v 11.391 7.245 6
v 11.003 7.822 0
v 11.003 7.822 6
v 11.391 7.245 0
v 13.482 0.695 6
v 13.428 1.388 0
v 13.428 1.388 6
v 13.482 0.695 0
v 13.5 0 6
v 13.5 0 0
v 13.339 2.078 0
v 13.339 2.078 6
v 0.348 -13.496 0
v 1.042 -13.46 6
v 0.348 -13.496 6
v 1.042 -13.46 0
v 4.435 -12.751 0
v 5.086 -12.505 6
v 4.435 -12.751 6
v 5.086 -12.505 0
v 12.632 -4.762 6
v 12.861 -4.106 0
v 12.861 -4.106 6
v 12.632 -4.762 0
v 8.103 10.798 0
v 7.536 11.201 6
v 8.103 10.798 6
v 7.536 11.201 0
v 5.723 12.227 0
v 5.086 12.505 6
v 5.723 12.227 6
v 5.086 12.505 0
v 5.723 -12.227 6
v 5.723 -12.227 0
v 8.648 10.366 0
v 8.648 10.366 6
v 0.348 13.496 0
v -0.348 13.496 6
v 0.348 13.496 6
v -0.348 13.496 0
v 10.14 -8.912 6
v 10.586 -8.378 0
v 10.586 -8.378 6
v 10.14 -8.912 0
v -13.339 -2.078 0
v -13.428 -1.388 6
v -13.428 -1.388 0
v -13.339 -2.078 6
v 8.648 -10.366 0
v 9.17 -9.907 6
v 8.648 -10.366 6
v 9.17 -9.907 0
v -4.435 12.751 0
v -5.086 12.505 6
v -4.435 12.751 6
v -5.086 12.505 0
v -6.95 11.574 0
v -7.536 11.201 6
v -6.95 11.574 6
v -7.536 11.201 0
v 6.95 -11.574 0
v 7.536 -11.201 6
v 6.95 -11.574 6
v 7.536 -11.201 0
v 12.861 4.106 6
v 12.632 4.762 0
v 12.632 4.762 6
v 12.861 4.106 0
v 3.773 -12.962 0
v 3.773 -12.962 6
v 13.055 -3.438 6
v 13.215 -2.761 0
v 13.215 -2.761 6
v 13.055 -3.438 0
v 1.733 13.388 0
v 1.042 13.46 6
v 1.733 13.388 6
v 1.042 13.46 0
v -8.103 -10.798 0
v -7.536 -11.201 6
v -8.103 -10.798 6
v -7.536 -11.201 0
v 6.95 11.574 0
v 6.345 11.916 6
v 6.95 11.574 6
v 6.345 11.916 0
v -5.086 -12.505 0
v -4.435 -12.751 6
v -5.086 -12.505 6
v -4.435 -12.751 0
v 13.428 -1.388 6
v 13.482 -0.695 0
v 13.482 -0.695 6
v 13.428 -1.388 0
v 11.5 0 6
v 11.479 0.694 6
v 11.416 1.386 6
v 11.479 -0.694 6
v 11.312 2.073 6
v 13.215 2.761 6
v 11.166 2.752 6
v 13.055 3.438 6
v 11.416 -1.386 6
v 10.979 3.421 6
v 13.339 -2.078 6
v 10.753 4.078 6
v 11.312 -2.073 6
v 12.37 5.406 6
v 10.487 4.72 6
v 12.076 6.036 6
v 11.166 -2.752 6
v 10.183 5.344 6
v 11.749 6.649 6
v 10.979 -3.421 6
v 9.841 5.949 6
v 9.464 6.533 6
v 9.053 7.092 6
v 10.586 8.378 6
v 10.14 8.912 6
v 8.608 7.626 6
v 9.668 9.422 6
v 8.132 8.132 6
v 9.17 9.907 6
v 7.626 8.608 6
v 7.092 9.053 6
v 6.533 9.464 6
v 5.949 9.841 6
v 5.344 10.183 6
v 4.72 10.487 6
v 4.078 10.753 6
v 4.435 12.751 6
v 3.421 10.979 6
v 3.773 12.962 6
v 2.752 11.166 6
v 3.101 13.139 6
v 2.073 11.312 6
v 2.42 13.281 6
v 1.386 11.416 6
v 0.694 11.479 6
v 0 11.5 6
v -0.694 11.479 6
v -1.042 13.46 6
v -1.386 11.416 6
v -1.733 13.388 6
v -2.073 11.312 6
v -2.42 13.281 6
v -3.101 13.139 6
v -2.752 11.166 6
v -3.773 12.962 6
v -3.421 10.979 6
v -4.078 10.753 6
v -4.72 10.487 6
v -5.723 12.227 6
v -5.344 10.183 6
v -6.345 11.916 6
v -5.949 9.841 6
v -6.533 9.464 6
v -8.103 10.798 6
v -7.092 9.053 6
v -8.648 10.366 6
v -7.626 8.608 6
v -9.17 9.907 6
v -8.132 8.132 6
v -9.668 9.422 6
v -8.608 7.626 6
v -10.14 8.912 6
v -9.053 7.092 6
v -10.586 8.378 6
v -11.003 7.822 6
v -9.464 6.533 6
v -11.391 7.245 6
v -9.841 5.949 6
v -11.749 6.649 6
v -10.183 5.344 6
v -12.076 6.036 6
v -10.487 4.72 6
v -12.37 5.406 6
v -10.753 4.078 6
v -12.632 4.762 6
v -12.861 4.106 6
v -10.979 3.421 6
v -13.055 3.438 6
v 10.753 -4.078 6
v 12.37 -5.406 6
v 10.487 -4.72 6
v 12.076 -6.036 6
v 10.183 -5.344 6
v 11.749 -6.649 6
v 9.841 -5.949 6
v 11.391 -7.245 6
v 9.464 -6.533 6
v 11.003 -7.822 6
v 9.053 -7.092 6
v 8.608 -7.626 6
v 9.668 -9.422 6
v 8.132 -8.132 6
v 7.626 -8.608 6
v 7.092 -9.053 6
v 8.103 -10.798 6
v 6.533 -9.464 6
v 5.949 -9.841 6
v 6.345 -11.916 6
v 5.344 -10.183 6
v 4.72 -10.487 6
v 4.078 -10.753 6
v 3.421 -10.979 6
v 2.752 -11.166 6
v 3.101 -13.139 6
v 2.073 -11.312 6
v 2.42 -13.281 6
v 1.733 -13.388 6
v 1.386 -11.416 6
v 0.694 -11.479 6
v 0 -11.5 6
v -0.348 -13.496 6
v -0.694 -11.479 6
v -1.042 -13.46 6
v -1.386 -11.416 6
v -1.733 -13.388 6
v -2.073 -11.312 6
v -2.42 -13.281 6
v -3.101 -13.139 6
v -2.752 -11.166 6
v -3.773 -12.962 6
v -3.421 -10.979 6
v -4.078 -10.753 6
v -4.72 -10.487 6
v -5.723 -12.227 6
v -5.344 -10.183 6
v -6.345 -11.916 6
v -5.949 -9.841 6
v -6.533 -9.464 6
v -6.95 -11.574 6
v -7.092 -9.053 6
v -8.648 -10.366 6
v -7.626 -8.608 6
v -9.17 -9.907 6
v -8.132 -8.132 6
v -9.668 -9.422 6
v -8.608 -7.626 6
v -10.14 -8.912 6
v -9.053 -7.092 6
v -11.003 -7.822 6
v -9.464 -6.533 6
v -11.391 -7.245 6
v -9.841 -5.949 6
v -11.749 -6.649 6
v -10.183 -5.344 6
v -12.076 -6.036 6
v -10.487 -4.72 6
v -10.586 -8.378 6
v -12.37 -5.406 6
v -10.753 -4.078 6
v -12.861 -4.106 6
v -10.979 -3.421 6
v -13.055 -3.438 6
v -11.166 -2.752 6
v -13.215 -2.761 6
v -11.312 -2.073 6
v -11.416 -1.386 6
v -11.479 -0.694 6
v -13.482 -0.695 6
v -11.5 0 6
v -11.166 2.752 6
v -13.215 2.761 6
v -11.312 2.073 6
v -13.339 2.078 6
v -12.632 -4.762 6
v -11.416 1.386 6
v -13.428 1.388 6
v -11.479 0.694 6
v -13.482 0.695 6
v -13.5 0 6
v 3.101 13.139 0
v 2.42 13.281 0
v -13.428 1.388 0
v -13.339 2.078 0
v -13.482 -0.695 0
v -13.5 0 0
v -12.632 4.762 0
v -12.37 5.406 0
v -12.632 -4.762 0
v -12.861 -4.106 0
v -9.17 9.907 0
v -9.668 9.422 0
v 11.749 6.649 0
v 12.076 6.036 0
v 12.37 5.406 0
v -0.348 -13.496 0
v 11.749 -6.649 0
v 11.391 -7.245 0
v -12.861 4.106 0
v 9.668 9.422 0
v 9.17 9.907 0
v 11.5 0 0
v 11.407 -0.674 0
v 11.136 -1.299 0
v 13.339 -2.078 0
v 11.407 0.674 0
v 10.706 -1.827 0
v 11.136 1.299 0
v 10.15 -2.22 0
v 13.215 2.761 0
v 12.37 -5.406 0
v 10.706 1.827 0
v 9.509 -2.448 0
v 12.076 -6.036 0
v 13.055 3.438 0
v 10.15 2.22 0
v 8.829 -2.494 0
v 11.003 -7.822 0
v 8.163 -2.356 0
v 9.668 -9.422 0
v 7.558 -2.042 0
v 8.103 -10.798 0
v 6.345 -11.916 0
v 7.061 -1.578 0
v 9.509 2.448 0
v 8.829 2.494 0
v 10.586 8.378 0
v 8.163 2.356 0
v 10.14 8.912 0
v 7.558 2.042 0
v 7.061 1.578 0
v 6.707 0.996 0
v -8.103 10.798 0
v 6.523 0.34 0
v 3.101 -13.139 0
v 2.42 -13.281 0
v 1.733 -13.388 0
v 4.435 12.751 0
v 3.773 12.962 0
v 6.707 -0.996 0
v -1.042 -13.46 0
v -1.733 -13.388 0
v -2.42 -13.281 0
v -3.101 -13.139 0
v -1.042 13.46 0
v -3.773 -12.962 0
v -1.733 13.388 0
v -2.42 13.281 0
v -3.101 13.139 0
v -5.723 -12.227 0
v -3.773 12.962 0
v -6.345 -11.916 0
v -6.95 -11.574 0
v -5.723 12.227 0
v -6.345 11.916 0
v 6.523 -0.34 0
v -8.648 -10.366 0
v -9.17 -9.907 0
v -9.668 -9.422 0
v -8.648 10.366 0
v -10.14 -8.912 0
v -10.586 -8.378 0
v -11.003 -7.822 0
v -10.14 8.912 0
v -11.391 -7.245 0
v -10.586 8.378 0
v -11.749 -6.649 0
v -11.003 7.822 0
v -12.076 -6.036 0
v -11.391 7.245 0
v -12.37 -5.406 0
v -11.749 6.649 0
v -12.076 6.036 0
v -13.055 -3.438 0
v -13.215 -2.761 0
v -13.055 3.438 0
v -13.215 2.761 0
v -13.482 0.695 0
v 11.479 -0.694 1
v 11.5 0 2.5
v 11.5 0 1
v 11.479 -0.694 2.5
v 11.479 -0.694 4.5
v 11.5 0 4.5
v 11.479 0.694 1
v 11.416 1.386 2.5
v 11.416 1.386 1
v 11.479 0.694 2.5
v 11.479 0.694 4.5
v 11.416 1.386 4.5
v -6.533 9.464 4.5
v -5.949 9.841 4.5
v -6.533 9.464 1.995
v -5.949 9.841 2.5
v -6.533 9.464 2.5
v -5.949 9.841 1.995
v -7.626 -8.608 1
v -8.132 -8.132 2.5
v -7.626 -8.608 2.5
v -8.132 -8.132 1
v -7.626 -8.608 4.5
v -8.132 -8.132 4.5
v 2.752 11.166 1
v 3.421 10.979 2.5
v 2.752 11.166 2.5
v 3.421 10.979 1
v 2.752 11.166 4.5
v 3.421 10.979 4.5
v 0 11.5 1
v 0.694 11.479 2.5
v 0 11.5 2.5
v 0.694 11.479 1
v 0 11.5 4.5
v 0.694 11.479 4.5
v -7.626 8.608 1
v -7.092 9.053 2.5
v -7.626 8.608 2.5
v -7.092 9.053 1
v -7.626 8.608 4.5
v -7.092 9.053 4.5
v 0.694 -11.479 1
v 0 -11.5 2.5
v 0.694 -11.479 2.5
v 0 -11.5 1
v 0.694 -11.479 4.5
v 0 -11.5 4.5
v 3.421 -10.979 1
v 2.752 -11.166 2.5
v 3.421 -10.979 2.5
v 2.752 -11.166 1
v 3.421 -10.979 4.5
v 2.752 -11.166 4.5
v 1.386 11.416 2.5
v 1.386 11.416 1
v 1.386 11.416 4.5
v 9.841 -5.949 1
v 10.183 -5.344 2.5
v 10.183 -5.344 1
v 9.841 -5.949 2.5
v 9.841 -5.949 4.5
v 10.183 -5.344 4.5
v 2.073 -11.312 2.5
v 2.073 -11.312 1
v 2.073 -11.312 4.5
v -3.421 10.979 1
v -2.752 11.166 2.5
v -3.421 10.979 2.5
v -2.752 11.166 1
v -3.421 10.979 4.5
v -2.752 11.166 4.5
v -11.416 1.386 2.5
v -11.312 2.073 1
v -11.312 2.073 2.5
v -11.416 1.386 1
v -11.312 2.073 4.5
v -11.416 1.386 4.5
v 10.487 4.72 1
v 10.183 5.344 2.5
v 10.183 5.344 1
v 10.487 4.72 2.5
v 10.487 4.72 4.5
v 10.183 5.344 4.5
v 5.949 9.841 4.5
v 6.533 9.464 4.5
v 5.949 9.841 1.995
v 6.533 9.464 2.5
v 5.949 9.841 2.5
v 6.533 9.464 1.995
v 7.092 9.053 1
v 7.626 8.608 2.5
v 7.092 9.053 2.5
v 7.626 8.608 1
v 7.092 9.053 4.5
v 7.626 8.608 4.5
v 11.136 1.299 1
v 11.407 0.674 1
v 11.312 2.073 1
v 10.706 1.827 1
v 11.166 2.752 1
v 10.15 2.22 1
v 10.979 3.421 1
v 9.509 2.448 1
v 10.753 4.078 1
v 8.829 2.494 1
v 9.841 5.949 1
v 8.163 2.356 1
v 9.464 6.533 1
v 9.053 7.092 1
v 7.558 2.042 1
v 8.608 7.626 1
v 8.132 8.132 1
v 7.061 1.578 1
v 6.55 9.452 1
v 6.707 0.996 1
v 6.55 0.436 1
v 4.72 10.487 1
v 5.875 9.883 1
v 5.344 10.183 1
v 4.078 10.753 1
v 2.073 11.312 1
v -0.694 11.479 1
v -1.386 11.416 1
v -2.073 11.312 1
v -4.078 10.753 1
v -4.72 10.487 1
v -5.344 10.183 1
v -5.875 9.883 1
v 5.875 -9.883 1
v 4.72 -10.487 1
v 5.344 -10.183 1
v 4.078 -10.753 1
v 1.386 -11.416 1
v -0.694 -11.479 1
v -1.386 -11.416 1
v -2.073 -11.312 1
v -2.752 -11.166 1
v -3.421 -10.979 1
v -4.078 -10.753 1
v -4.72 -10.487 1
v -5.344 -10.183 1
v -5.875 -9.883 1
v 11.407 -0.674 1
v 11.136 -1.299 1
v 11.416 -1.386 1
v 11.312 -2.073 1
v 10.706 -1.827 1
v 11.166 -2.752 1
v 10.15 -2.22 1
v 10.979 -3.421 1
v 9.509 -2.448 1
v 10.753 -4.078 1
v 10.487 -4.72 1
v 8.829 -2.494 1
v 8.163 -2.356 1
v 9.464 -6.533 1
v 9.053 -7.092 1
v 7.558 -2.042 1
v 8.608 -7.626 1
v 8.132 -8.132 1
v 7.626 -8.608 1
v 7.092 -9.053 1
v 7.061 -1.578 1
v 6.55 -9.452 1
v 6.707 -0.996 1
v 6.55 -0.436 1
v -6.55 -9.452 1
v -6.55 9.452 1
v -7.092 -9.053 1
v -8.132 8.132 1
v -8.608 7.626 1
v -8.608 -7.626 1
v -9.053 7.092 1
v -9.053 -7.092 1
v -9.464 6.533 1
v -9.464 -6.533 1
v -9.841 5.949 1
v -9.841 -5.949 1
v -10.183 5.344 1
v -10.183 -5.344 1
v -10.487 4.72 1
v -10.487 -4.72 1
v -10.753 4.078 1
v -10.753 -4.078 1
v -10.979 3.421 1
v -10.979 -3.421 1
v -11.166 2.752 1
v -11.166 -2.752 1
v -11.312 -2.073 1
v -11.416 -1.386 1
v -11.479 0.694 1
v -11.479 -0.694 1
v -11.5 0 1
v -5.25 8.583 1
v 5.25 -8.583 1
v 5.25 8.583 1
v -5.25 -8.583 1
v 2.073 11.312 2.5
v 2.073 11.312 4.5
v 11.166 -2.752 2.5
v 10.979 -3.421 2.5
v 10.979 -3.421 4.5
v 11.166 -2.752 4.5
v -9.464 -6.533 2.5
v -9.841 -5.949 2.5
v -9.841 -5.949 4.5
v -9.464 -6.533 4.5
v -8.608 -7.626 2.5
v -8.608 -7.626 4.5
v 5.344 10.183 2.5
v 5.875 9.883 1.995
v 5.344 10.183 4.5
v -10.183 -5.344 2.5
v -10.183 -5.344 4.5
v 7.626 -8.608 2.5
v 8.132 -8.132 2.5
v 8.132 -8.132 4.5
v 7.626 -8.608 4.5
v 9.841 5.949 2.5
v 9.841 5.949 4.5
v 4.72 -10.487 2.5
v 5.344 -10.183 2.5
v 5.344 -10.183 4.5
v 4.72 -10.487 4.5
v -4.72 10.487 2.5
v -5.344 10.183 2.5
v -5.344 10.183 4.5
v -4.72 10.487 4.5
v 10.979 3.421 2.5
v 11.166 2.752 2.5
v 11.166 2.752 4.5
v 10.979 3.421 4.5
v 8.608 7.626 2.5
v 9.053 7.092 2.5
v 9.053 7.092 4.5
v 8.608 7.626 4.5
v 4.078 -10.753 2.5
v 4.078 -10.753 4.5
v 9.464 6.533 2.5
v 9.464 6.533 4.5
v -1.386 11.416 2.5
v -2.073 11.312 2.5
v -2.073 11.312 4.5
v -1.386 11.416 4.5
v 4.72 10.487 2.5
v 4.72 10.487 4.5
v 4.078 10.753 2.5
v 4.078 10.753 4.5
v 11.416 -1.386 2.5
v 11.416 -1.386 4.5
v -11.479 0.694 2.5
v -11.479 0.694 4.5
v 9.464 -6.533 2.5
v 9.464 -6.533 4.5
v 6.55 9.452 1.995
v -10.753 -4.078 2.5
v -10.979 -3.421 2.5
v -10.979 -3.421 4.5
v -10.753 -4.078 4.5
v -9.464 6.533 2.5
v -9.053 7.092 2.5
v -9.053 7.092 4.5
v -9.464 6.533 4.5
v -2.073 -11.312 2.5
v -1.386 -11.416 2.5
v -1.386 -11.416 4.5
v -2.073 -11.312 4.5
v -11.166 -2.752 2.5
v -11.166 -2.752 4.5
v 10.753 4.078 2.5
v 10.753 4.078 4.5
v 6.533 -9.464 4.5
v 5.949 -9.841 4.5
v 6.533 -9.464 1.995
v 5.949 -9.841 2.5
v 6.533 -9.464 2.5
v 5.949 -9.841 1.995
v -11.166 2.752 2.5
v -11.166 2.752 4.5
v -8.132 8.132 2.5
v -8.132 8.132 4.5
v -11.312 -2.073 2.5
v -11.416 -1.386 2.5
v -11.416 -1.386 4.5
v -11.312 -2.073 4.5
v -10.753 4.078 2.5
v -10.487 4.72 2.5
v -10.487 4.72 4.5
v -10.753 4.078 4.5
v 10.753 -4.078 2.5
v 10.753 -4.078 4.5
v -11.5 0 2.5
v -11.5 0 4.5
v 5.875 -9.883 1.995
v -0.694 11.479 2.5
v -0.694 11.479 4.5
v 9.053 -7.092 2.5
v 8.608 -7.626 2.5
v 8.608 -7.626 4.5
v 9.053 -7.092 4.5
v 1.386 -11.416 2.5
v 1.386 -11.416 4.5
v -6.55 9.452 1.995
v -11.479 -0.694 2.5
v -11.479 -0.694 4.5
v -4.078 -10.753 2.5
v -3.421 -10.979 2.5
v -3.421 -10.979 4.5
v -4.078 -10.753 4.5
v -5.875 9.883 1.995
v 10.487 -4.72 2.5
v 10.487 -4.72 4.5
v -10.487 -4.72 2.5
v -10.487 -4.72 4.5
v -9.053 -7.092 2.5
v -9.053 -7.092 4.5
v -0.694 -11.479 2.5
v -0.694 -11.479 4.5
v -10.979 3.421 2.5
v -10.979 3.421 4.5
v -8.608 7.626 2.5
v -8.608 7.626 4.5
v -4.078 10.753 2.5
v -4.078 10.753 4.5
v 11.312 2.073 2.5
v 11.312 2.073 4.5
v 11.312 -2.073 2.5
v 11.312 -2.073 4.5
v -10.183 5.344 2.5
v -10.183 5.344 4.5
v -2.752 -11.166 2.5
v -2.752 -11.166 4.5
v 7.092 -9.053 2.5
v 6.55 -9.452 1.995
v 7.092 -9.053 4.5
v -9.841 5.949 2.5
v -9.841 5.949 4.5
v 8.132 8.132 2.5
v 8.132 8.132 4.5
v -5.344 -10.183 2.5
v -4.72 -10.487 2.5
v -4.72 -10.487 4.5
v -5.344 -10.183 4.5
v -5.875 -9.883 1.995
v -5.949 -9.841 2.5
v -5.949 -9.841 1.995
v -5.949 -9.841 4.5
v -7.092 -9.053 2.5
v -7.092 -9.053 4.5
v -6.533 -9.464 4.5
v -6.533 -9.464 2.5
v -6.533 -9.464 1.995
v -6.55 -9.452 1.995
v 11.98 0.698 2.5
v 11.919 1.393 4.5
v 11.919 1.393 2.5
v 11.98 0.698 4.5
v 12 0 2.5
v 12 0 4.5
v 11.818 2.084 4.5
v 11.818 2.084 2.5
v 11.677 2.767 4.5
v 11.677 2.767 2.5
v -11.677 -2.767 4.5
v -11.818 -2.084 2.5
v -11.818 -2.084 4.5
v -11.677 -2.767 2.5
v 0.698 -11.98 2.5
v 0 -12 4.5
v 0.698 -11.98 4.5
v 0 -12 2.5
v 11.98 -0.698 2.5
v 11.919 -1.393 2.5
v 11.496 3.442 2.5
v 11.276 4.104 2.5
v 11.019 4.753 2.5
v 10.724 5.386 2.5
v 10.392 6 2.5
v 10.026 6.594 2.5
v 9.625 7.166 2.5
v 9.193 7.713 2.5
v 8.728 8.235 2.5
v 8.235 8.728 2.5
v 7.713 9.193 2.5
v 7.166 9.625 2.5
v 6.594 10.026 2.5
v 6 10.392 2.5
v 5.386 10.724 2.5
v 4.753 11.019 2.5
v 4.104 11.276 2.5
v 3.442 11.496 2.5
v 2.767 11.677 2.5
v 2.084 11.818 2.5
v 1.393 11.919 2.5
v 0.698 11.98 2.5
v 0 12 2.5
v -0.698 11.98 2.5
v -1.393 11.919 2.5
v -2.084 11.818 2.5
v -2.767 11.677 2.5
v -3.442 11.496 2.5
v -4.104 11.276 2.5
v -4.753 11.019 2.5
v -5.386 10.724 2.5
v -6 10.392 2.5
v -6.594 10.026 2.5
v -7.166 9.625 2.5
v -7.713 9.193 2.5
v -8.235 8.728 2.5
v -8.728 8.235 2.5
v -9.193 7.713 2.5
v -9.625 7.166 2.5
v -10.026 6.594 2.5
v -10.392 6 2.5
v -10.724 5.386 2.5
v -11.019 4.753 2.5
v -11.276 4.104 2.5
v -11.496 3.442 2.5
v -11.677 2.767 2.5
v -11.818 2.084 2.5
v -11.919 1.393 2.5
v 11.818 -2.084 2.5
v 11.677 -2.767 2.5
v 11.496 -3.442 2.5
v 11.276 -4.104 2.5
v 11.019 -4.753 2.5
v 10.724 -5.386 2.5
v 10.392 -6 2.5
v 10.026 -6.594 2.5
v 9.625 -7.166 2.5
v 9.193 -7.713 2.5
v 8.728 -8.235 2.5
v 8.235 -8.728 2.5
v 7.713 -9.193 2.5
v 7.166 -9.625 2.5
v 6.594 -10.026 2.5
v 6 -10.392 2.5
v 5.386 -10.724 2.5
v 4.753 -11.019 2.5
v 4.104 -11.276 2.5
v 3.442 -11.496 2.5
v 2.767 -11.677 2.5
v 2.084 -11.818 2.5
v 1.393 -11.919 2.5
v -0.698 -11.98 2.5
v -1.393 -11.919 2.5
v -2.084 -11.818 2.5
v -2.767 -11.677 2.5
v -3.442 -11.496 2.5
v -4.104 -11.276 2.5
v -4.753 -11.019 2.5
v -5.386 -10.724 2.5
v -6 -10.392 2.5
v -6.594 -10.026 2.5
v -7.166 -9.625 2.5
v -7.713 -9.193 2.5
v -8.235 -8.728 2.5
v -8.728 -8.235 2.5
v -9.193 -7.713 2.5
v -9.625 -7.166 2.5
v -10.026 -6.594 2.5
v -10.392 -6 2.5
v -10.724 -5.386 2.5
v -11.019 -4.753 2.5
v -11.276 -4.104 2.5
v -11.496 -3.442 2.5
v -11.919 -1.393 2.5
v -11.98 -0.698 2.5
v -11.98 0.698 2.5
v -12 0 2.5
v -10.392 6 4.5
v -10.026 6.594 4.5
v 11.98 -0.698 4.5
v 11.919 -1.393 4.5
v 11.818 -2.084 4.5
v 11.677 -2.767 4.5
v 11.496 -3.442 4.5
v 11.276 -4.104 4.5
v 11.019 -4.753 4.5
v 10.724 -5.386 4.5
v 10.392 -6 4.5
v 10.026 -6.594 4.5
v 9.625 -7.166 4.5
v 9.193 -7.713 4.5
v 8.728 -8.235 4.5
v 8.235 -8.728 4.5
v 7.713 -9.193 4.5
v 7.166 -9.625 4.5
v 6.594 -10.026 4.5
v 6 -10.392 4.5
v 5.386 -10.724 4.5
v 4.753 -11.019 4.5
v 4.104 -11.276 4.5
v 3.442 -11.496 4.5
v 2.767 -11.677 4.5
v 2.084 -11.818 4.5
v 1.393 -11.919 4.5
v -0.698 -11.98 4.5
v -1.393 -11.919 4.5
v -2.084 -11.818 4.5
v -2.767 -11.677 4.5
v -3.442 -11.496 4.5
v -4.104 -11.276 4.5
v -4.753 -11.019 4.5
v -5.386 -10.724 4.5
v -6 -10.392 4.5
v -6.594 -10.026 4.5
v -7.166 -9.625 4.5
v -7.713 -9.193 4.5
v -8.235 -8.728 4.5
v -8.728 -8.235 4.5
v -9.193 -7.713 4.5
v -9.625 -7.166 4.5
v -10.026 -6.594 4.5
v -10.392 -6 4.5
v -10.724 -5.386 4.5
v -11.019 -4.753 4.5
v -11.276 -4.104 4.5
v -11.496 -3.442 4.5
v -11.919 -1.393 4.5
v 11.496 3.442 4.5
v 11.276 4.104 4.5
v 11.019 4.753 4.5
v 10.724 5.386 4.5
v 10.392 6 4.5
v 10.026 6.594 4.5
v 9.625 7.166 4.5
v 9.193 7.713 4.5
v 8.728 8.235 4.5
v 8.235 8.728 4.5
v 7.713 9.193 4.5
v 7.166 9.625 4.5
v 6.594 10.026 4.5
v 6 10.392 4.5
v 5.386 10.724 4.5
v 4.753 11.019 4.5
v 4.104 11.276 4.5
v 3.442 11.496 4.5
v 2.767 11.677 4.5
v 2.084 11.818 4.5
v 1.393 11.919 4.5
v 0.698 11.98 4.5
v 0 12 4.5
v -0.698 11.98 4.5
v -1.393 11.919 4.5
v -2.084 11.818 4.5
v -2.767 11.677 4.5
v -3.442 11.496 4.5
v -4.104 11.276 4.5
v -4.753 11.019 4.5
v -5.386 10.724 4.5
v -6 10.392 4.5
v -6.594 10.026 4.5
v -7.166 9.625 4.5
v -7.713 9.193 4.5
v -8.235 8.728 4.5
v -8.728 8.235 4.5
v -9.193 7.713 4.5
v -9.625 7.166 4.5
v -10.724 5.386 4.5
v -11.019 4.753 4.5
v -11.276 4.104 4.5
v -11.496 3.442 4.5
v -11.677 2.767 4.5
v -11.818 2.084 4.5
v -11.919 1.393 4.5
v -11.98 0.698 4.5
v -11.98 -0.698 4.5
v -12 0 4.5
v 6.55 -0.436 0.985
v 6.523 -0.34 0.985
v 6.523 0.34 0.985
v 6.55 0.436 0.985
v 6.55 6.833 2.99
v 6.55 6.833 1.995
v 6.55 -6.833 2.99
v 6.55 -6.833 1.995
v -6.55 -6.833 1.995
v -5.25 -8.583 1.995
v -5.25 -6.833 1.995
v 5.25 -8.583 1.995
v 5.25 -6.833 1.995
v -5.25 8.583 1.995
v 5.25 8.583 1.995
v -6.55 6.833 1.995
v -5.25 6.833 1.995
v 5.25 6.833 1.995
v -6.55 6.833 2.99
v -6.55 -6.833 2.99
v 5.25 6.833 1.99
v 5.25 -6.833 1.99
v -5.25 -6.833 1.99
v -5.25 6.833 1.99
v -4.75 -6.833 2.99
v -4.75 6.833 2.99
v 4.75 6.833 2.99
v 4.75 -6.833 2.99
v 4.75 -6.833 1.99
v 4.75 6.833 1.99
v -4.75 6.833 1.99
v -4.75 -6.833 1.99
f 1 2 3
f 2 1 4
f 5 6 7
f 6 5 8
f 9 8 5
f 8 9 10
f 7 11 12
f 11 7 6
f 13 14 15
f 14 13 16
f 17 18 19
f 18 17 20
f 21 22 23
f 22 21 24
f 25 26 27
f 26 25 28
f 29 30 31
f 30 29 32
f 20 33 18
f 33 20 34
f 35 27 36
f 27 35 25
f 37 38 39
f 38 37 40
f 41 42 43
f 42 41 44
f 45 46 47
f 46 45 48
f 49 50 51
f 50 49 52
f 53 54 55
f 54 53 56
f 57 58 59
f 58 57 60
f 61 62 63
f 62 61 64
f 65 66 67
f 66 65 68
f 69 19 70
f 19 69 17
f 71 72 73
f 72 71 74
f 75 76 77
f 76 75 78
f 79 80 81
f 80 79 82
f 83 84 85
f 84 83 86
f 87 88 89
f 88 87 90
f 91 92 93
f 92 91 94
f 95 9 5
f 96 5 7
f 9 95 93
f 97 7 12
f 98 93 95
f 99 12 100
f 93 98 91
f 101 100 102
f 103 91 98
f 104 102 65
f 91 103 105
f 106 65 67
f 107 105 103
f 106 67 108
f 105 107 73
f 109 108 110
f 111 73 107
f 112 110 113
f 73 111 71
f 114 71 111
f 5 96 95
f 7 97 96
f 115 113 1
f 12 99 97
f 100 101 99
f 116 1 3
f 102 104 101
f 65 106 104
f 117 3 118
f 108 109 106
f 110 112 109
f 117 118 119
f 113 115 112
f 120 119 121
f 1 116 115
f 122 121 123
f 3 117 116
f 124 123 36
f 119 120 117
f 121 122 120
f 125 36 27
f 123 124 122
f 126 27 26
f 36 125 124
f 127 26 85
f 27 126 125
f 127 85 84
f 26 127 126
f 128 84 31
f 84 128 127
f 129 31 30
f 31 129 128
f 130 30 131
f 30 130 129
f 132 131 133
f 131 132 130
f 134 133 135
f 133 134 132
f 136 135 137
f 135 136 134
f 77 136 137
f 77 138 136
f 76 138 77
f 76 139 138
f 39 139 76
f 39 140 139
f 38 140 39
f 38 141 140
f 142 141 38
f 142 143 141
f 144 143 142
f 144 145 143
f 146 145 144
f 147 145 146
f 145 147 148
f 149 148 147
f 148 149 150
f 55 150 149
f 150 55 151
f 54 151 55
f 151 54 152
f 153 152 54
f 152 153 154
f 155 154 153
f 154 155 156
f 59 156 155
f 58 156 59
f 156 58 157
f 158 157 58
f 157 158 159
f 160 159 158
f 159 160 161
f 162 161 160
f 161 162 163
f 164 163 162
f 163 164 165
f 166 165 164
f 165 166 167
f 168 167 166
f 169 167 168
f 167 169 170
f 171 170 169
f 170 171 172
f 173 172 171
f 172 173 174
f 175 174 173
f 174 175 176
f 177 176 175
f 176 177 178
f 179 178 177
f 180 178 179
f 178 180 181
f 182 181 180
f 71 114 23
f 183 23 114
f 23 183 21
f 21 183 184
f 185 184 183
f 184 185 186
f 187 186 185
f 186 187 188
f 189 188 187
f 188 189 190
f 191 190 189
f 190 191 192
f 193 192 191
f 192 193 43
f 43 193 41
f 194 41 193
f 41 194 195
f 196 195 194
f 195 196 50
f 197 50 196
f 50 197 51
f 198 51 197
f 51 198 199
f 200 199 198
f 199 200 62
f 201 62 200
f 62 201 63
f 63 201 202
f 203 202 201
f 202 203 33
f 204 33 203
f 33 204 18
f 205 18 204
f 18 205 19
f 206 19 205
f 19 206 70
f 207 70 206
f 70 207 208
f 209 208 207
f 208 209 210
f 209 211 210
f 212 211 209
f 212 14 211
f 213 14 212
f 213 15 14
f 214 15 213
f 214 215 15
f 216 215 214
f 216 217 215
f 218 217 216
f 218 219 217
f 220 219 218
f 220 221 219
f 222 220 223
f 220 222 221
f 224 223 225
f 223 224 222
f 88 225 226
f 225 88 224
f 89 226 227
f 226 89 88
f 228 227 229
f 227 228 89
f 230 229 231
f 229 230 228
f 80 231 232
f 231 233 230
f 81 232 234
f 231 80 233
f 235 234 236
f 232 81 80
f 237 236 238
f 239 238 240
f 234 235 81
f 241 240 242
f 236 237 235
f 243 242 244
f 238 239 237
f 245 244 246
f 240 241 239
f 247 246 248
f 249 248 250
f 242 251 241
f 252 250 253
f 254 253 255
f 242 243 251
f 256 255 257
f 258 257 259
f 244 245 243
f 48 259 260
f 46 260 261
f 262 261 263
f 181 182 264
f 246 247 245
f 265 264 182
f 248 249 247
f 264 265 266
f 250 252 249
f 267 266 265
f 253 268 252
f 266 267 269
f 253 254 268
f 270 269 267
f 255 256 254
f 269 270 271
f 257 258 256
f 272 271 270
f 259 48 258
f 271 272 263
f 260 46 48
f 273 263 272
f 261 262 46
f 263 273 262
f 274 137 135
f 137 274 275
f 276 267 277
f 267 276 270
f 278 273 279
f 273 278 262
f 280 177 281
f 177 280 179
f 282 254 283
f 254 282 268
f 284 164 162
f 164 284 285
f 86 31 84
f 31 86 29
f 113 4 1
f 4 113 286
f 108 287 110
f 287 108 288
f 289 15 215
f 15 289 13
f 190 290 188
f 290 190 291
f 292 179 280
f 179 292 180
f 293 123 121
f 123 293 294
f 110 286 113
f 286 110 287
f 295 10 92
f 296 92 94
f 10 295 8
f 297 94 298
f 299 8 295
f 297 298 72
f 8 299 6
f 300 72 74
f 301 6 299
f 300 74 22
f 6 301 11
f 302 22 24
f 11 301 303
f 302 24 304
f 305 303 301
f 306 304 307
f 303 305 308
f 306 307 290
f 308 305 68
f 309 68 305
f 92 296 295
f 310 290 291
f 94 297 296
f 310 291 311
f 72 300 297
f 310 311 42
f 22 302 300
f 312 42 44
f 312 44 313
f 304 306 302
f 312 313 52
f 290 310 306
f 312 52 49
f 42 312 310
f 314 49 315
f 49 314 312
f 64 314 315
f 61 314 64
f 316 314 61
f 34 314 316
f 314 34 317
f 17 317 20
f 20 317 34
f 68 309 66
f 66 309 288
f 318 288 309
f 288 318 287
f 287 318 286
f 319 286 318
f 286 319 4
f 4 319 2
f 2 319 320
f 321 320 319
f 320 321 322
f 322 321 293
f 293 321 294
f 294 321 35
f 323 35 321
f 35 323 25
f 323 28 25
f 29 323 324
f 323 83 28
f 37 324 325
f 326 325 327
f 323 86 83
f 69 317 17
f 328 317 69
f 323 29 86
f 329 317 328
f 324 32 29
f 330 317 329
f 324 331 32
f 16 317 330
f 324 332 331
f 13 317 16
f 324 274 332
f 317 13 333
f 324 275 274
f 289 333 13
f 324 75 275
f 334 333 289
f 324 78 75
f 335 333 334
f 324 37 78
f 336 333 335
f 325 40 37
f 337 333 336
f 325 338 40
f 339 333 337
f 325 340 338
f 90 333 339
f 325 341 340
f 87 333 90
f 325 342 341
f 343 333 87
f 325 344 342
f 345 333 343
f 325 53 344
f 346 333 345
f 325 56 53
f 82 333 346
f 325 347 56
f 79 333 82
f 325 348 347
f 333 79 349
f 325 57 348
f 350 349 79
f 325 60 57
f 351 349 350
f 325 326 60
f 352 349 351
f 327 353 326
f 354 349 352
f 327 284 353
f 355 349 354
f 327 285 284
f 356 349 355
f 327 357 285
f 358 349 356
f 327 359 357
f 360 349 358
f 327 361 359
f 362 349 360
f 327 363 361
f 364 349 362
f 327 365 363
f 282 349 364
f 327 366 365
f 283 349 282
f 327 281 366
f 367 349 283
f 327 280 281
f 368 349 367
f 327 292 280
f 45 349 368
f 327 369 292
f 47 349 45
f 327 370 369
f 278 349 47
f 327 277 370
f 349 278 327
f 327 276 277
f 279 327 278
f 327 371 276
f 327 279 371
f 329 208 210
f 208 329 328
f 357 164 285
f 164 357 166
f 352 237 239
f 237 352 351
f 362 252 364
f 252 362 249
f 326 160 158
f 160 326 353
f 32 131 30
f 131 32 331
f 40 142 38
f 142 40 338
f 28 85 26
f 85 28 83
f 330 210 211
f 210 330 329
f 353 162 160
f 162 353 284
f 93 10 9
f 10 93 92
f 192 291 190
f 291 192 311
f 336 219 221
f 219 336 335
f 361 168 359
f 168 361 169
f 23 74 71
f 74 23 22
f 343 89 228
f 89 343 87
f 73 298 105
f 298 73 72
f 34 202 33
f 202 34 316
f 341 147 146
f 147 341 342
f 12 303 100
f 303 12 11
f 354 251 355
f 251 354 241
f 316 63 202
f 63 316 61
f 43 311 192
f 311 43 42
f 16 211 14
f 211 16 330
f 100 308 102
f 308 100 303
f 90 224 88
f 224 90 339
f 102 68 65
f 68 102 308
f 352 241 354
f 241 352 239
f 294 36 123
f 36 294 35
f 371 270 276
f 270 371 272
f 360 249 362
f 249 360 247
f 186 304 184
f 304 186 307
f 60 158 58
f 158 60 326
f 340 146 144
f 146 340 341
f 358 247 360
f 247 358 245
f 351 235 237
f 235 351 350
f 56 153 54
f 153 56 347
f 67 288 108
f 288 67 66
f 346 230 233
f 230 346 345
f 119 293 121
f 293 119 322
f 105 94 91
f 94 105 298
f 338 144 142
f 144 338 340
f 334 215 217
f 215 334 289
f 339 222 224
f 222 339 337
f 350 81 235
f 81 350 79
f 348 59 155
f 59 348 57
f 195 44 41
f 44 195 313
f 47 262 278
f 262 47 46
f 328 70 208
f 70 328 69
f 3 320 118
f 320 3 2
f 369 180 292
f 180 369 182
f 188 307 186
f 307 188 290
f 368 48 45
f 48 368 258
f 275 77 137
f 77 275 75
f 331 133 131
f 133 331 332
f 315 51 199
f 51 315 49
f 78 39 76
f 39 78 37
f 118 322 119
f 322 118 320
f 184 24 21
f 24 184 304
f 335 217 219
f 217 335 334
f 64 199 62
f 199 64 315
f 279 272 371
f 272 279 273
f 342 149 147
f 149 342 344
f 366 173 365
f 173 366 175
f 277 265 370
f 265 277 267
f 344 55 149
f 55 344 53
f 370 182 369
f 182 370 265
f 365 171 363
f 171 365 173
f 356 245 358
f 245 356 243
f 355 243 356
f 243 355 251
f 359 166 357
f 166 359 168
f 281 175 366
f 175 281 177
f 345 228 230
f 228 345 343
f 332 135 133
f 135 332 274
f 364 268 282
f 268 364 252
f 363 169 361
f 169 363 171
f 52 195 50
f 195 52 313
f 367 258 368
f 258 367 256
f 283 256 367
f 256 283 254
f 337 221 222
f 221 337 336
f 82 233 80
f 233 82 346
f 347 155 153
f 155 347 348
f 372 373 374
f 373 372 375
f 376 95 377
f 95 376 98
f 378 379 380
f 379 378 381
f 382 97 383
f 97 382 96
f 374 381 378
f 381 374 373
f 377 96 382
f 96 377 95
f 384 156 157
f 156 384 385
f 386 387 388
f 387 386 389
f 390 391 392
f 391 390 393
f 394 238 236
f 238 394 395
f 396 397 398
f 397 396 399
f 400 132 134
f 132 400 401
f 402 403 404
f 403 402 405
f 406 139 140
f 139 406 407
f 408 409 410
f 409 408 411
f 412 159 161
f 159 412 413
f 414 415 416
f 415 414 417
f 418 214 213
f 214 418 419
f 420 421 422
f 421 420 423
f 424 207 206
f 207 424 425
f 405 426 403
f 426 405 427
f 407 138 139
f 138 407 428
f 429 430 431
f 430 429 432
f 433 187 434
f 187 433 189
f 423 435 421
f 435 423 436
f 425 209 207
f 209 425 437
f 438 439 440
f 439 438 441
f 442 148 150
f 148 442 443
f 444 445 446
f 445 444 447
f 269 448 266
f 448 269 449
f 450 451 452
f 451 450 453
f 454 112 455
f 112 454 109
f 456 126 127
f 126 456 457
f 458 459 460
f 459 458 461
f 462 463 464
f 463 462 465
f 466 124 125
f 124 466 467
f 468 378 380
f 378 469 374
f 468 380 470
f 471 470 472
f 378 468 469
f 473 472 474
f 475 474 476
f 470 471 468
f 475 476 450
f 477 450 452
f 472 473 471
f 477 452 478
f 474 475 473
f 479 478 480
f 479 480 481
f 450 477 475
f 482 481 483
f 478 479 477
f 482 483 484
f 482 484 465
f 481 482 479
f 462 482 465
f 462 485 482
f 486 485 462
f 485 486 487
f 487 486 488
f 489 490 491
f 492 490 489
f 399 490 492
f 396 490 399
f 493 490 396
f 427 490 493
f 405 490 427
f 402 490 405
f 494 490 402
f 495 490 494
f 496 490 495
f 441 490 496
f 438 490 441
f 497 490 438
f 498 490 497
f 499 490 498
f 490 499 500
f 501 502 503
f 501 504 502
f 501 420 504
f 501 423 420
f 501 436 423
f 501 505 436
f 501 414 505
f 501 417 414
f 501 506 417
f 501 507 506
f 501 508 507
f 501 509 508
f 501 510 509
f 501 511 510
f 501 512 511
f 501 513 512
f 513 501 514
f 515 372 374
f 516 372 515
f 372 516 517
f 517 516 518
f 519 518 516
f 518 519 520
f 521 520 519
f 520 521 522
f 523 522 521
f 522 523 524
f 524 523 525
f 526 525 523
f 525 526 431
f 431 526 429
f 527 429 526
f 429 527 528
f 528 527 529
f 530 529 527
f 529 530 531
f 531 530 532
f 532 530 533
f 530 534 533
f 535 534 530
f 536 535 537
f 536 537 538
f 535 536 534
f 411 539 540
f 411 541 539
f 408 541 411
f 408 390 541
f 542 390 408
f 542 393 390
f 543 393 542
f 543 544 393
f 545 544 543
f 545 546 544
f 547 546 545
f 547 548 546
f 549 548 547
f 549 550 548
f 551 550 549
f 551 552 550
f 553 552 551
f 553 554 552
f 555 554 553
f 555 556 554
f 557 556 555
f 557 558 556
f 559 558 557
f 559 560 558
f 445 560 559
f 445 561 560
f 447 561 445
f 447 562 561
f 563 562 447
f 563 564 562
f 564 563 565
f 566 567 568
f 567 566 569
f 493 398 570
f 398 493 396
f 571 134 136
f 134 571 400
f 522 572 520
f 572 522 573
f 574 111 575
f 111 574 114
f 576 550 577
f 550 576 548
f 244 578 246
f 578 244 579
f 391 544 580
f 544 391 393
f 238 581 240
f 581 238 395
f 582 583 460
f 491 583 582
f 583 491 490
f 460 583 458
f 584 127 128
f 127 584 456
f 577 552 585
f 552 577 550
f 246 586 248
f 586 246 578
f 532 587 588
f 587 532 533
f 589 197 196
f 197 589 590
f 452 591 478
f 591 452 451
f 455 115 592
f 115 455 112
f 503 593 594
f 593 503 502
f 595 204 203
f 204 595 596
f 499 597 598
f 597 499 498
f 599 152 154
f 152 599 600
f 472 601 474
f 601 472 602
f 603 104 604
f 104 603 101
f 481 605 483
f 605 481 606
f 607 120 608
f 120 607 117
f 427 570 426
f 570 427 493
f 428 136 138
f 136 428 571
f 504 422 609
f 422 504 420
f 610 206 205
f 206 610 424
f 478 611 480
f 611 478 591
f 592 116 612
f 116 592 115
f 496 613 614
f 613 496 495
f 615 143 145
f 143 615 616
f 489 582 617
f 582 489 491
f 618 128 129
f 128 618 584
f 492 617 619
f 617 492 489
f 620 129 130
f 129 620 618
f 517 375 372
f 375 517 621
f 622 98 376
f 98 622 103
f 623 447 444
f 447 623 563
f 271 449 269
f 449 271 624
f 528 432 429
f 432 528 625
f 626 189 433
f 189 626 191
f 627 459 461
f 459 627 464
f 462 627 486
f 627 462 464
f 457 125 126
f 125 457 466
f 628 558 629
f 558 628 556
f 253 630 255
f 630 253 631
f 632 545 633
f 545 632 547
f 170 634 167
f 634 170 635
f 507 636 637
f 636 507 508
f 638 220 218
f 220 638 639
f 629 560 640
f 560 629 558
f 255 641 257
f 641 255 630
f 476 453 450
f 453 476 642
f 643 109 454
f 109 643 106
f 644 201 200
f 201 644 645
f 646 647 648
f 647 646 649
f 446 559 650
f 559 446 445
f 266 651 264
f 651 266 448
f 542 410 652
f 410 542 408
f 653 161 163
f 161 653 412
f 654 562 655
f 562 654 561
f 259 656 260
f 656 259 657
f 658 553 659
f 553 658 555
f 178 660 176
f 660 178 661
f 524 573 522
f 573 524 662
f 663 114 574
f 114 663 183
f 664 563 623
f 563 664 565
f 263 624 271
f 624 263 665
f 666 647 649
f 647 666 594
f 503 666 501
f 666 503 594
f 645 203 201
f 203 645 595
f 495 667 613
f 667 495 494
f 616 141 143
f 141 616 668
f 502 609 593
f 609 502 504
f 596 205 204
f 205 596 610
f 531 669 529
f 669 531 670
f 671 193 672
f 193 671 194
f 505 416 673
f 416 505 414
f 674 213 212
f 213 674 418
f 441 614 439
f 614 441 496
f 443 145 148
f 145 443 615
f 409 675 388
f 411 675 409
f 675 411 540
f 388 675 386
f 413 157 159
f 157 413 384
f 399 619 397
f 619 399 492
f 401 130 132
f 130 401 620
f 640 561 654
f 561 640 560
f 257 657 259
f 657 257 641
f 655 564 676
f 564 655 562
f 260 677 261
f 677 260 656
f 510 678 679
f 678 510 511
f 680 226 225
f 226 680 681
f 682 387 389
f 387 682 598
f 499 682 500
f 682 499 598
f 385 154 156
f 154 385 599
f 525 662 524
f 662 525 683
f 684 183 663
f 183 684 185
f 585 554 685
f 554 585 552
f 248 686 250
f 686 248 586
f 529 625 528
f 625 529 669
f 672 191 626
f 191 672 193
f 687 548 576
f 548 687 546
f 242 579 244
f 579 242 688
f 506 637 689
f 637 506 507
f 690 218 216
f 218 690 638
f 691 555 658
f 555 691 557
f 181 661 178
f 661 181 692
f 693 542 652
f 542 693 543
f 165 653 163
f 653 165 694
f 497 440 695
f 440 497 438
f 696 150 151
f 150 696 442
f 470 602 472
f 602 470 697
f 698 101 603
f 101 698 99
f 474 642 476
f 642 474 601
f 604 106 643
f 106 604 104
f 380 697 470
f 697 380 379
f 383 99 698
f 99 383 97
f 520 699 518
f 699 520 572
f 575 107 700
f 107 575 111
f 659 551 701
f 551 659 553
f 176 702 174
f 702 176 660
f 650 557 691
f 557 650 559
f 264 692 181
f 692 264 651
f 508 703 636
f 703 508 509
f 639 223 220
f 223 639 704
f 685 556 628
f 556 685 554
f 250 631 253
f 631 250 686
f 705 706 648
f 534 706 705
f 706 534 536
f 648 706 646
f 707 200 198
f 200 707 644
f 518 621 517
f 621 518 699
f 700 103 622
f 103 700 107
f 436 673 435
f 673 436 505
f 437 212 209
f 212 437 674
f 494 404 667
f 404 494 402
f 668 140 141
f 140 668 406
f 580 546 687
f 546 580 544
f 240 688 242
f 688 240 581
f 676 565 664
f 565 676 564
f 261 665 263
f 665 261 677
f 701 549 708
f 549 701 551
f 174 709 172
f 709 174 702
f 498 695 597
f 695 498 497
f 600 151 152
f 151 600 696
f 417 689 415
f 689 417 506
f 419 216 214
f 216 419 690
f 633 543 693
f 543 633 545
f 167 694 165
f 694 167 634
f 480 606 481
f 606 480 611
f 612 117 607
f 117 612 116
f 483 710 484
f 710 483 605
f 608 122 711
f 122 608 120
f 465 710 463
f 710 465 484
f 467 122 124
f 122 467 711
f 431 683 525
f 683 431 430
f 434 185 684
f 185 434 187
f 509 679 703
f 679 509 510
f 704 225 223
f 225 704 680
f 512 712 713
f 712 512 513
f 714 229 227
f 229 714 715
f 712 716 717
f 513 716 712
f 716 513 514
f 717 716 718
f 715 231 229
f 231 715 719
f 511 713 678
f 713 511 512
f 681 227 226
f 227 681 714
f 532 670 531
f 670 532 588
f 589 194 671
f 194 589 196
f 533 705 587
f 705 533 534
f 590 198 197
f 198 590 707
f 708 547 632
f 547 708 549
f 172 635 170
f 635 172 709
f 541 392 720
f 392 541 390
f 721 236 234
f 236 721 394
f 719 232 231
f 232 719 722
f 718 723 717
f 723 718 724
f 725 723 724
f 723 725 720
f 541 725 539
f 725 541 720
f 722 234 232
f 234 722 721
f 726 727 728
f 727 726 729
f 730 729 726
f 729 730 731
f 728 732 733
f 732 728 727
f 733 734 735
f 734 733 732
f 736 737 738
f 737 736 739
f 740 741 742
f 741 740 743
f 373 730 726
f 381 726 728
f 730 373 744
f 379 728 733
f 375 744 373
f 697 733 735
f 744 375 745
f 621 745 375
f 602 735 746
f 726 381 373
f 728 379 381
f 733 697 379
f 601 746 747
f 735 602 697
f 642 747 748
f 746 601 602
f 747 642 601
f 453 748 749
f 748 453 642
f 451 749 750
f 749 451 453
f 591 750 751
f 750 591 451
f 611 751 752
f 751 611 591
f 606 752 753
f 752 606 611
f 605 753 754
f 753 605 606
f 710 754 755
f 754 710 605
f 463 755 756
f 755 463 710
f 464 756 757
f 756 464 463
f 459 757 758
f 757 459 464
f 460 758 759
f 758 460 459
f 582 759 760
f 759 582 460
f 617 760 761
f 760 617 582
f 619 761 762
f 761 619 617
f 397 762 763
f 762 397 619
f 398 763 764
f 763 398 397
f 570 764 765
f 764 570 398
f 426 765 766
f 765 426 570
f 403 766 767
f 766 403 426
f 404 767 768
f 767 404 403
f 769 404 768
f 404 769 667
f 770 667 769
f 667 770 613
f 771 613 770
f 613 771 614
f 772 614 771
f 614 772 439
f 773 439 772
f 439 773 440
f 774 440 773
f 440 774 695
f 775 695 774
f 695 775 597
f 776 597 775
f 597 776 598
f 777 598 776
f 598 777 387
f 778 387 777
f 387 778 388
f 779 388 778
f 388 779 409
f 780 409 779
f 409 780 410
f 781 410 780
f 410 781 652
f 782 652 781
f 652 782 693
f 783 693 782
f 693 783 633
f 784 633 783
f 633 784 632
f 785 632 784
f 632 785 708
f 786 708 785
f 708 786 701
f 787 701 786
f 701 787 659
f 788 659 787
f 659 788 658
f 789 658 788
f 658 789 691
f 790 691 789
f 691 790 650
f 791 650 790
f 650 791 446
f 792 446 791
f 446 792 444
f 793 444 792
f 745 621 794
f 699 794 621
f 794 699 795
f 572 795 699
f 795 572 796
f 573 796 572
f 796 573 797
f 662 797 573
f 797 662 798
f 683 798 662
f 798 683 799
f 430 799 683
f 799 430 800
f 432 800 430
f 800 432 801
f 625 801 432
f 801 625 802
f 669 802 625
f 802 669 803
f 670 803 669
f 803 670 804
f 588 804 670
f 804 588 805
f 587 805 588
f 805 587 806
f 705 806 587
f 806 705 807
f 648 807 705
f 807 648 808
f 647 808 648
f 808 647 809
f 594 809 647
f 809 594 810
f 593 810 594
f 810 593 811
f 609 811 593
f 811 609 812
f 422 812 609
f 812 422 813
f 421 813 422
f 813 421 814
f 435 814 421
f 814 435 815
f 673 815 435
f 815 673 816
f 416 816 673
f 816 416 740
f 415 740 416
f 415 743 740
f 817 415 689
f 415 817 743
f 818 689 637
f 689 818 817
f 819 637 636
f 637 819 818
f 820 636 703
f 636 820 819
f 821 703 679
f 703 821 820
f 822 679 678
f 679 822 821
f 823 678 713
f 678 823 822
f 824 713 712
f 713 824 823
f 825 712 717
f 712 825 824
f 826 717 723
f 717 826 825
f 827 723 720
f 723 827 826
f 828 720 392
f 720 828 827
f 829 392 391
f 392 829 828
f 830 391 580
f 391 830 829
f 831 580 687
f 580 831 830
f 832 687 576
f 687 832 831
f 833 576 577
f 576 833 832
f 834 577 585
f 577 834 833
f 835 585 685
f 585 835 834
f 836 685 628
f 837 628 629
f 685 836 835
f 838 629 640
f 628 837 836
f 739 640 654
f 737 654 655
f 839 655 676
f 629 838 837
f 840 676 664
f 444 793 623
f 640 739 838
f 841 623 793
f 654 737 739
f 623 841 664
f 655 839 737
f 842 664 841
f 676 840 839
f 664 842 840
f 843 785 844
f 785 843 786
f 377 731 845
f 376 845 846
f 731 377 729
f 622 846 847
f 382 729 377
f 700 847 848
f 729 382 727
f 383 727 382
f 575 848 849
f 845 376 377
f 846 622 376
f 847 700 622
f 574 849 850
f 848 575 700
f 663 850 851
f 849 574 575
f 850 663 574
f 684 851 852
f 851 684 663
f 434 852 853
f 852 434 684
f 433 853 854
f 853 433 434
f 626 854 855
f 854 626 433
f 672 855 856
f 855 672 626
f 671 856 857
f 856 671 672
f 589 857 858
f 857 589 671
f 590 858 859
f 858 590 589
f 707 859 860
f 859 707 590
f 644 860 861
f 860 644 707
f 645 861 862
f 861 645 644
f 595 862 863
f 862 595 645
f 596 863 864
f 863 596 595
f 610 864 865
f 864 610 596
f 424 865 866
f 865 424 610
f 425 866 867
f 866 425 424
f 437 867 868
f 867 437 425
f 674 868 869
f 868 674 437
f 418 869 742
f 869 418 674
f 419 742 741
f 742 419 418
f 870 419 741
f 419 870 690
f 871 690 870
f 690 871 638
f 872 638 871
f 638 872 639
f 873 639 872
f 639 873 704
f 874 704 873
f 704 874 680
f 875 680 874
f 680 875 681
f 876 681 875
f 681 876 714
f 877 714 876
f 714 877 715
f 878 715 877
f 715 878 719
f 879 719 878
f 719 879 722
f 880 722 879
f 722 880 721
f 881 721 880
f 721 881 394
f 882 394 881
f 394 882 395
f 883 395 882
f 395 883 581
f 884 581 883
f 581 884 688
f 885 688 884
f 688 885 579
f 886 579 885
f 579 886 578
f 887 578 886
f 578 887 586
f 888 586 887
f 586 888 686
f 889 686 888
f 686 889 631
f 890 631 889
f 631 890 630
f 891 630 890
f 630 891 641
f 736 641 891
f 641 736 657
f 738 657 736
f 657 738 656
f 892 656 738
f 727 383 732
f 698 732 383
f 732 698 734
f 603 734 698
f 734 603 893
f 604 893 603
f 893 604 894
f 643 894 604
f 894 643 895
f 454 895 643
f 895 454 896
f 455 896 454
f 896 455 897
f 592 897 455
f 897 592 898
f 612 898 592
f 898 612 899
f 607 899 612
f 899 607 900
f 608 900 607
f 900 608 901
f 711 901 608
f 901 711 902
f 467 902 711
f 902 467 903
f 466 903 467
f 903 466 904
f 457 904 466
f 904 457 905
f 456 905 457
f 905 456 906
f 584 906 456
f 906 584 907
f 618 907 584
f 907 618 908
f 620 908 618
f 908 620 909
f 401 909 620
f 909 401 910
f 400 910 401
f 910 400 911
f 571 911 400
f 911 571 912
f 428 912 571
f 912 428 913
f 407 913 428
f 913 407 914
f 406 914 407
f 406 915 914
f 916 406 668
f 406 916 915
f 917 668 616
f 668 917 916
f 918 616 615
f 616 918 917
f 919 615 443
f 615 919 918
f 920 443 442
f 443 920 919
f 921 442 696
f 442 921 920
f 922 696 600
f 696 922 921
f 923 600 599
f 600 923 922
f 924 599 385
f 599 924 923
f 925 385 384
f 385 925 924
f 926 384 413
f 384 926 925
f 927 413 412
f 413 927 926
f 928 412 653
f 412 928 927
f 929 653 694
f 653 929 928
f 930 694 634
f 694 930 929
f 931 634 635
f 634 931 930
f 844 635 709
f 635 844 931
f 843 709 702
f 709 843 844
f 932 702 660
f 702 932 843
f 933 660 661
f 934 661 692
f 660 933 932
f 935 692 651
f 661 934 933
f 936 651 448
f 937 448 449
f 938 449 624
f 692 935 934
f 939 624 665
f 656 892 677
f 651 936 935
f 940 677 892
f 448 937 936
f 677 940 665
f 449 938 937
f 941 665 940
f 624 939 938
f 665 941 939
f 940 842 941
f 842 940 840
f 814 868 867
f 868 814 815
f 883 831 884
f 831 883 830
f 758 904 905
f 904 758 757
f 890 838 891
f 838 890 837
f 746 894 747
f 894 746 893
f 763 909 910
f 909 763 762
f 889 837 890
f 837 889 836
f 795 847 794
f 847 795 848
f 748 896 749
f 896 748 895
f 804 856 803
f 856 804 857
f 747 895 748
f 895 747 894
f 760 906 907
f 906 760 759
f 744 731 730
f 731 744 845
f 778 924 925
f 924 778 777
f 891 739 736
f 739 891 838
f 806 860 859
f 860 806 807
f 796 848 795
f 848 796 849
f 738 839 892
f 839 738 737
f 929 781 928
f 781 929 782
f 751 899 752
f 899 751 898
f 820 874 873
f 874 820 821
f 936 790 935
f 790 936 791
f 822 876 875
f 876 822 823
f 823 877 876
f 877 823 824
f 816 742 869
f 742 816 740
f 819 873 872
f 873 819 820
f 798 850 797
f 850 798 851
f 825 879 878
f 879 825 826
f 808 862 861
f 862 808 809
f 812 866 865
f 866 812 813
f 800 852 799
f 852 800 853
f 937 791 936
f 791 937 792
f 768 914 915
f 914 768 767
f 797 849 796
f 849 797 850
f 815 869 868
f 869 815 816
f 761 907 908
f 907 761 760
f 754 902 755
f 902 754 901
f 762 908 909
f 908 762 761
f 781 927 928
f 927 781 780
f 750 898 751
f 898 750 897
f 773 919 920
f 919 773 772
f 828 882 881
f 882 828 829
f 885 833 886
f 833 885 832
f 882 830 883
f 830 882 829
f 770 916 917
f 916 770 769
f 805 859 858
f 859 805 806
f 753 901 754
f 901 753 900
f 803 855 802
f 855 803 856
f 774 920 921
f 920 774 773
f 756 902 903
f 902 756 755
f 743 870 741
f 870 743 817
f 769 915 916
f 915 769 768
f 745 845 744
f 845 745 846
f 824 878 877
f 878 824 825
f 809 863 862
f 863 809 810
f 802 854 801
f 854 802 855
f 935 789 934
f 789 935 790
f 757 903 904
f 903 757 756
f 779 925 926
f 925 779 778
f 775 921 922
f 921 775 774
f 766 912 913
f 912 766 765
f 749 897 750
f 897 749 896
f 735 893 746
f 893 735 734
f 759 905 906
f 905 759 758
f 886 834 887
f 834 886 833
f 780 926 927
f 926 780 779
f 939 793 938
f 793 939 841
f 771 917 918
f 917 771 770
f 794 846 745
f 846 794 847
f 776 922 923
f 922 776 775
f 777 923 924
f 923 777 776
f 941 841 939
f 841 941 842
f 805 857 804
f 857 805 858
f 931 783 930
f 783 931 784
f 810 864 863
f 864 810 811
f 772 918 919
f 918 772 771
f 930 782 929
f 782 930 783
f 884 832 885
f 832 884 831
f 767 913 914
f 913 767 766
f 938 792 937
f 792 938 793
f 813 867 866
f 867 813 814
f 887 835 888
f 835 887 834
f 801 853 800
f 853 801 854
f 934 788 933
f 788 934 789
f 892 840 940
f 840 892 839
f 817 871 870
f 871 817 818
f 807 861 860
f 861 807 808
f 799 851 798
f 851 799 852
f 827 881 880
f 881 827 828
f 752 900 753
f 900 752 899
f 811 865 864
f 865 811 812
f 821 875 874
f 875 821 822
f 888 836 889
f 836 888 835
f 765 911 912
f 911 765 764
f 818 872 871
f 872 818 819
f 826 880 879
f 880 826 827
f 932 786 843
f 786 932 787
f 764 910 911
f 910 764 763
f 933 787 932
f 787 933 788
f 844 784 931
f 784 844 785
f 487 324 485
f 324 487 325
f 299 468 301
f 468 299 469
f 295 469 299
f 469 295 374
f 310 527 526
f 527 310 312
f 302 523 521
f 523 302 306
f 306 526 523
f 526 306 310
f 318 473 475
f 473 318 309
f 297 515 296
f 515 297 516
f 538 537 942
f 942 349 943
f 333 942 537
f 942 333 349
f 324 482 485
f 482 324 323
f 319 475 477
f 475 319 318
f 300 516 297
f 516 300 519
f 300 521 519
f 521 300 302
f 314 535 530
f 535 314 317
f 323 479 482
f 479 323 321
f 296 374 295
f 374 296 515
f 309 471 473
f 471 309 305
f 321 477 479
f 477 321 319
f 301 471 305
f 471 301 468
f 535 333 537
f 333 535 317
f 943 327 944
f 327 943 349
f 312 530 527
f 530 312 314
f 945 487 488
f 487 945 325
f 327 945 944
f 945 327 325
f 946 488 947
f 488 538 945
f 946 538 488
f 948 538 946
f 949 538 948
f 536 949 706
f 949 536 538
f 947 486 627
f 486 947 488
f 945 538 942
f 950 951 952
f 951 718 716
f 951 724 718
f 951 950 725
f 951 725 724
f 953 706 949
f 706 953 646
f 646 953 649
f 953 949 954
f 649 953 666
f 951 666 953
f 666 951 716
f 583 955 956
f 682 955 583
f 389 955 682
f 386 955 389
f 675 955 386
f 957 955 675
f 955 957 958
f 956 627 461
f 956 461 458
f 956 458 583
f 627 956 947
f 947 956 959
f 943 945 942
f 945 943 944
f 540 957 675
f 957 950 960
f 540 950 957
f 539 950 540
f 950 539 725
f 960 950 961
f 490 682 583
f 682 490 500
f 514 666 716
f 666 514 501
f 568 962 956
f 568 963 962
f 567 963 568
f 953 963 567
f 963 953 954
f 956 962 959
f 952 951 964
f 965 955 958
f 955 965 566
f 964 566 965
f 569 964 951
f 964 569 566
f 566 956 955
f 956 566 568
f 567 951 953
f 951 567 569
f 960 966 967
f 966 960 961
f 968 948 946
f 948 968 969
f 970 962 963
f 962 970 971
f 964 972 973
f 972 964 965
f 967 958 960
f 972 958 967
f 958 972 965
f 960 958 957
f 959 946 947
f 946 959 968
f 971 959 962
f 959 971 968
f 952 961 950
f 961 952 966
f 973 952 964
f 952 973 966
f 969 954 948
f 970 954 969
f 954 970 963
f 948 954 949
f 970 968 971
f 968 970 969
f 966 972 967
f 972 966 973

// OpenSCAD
//***************************************************************************
//
//    COPYRIGHT (C) 2017 JOHN WINANS
//
//    This program is free software: you can redistribute it and/or modify
//    it under the terms of the GNU General Public License as published by
//    the Free Software Foundation, either version 3 of the License, or
//    (at your option) any later version.
//
//    This program is distributed in the hope that it will be useful,
//    but WITHOUT ANY WARRANTY; without even the implied warranty of
//    MERCHANTABILITY or FITNESS FOR A PARTICULAR PURPOSE.  See the
//    GNU General Public License for more details.
//
//    You should have received a copy of the GNU General Public License
//    along with this program.  If not, see <http://www.gnu.org/licenses/>.
//
//    Get your copy from here:
//
//       https://github.com/johnwinans/7SegLED
//
//***************************************************************************

iDia=23;            // the inside diameter of the dot
wallthick=2;        // the outside wall thickness of the dot
backz=1;            // the thickness of the base
facez=1;            // the thickness of the face
hollowzb=5;         // the 'hollow' inside depth of the back
hollowzf=13;        // the 'hollow' inside depth of the front

ledff=.5;           // a fudge-factor for the LED dimensions
ledlen=100/6;       // length of one LED on the strip
ledwidth=10;        // width of the LED strip (not including the fudge factor)

$fa=1;              // select a reasonable resolution
$fs=.7;             // select a reasonable resolution


// uncomment one of the following to render a front or back:
back();             // render the back
//front();            // render the front




module front()
{
    dot(iDia, wallthick, hollowzf, facez, tongue=true);
}

module back()
{
    dot(iDia, wallthick, hollowzb, backz, groove=true, access=true, align=true);
}

/**
* Render a dot with optional tongue, groove and/or LED strip retainer.
*
* @param id The inside diameter of the dot cylinder
* @param wt The outter-wall thickness of the dot
* @param iz The inside Z-dimension (how much it is to be hollowed out)
* @param bz The face/back Z-dimension (how thick the face or back is to be)
* @param tongue If true then include a snap-together tongue
* @param groove If true then include a groove for the tongue to snap into
* @param access If true then include an access hole for wires
* @param align If true include a retainer to hold the LED strip
*****************************************************************************/
module dot(id, wt, iz, bz, tongue=false, groove=false, access=false, align=false)
{
    od=id+2*wt;     // outside diameter of the dot
    oz=iz+bz;       // Z-height of the dot (not including an optional tongue)

    tff=.2;         // printing fudge-factor for tongue allowance
    tzff=.5;        // extra height added to the groove slot so tongue will fit
    tod=id-tff*2;   // OD of the tongue
    tid=tod-2*wt;   // ID of the tongue
    tlen=3;         // z-height of the tongue
    tlipz=1;        // z-height of the lip
    tlipx=1;        // how far the lip sticks out from the tongue in the x-axis
    tzoverlap=wt;   // how far the tongue overlaps the 'inside' of the dot cylinder
 
    accessDia=5;    // access hole diameter (for wires)
    
    alignz=1;       // how tall the LED alignment box is
    alignwt=1.3;    // how thick the walls of the LED alignment box are
    retainz=1;      // the height of the retainer
    retainff=.5;    // how far to cover the LED with the retainer
    
    difference()
    {
        cylinder(d=od, h=oz);           // the main outer body of the dot
        translate([0,0,oz-iz]) cylinder(d=id, h=iz+.1); // remove the inside space (make it hollow)

        if (groove)
        {
            // a groove around the inside of the back to let the front sanap into the back
            translate([0,0,oz-tlen-tzff]) cylinder(d=id+tlipx, h=tlipz+tzff*2);
        }

        if (access)
        {
            // a hole for wire access
            translate([id/2-accessDia/2, 0,-.1]) cylinder(d=accessDia, h=bz+.2);
        }
    }

    
    if (align)
    {
        // some lines to align the LED strip against the back
        translate([0, 0, bz+alignz/2-.01])
        difference()
        {
            cube ([ledwidth+ledff+alignwt*2, ledlen+ledff+alignwt*2, alignz+.01], center=true);
            cube ([ledwidth+ledff, ledlen+ledff, alignz+.02], center=true);
        }
        
        // a retaining lip along the top
        translate([0, 0, bz+alignz+retainz/2-.01])
        difference()
        {
            cube ([ledwidth+ledff+alignwt*2, ledlen-3, retainz], center=true);
            cube ([ledwidth-retainff, ledlen-3+.02, retainz+.02], center=true);
        }
    }

    
    if (tongue)
    {
        intersection()
        {
            union()
            {
                // the tongue
                translate([0,0,oz-tzoverlap])
                difference()
                {
                    union()
                    {
                        cylinder(d=tod, h=tlen+tzoverlap);      // outside
                        cylinder(d=od, h=tzoverlap);            // fill the tff gap
                    }
                    translate([0,0,-.1])
                    {
                        cylinder(d=tid, h=tlen+tzoverlap+.2);   // remove the inside
                        cylinder(d1=id, d2=tid, h=tzoverlap);   // put a wedge on the bottom (easier printing)
                    }
                }
        
                // a rim around the tip of the tongue
                translate([0,0,oz+tlen-tlipz])
                {
                    difference()
                    {
                        cylinder(d=tod+.7, h=tlipz);                    // the rim
                        translate([0,0,-.1]) cylinder(d=tid, h=tlipz+.2);   // hollow out the rim cylinder
                    }
                }
        
            } // union
            
            // remove some of the tongue so that it only has two ends
            translate([-od/2,-od/6,oz-tzoverlap-.01]) cube([od, od/3, oz+tlen+tzoverlap+.02]);
            
        } // intersection
    }
}
